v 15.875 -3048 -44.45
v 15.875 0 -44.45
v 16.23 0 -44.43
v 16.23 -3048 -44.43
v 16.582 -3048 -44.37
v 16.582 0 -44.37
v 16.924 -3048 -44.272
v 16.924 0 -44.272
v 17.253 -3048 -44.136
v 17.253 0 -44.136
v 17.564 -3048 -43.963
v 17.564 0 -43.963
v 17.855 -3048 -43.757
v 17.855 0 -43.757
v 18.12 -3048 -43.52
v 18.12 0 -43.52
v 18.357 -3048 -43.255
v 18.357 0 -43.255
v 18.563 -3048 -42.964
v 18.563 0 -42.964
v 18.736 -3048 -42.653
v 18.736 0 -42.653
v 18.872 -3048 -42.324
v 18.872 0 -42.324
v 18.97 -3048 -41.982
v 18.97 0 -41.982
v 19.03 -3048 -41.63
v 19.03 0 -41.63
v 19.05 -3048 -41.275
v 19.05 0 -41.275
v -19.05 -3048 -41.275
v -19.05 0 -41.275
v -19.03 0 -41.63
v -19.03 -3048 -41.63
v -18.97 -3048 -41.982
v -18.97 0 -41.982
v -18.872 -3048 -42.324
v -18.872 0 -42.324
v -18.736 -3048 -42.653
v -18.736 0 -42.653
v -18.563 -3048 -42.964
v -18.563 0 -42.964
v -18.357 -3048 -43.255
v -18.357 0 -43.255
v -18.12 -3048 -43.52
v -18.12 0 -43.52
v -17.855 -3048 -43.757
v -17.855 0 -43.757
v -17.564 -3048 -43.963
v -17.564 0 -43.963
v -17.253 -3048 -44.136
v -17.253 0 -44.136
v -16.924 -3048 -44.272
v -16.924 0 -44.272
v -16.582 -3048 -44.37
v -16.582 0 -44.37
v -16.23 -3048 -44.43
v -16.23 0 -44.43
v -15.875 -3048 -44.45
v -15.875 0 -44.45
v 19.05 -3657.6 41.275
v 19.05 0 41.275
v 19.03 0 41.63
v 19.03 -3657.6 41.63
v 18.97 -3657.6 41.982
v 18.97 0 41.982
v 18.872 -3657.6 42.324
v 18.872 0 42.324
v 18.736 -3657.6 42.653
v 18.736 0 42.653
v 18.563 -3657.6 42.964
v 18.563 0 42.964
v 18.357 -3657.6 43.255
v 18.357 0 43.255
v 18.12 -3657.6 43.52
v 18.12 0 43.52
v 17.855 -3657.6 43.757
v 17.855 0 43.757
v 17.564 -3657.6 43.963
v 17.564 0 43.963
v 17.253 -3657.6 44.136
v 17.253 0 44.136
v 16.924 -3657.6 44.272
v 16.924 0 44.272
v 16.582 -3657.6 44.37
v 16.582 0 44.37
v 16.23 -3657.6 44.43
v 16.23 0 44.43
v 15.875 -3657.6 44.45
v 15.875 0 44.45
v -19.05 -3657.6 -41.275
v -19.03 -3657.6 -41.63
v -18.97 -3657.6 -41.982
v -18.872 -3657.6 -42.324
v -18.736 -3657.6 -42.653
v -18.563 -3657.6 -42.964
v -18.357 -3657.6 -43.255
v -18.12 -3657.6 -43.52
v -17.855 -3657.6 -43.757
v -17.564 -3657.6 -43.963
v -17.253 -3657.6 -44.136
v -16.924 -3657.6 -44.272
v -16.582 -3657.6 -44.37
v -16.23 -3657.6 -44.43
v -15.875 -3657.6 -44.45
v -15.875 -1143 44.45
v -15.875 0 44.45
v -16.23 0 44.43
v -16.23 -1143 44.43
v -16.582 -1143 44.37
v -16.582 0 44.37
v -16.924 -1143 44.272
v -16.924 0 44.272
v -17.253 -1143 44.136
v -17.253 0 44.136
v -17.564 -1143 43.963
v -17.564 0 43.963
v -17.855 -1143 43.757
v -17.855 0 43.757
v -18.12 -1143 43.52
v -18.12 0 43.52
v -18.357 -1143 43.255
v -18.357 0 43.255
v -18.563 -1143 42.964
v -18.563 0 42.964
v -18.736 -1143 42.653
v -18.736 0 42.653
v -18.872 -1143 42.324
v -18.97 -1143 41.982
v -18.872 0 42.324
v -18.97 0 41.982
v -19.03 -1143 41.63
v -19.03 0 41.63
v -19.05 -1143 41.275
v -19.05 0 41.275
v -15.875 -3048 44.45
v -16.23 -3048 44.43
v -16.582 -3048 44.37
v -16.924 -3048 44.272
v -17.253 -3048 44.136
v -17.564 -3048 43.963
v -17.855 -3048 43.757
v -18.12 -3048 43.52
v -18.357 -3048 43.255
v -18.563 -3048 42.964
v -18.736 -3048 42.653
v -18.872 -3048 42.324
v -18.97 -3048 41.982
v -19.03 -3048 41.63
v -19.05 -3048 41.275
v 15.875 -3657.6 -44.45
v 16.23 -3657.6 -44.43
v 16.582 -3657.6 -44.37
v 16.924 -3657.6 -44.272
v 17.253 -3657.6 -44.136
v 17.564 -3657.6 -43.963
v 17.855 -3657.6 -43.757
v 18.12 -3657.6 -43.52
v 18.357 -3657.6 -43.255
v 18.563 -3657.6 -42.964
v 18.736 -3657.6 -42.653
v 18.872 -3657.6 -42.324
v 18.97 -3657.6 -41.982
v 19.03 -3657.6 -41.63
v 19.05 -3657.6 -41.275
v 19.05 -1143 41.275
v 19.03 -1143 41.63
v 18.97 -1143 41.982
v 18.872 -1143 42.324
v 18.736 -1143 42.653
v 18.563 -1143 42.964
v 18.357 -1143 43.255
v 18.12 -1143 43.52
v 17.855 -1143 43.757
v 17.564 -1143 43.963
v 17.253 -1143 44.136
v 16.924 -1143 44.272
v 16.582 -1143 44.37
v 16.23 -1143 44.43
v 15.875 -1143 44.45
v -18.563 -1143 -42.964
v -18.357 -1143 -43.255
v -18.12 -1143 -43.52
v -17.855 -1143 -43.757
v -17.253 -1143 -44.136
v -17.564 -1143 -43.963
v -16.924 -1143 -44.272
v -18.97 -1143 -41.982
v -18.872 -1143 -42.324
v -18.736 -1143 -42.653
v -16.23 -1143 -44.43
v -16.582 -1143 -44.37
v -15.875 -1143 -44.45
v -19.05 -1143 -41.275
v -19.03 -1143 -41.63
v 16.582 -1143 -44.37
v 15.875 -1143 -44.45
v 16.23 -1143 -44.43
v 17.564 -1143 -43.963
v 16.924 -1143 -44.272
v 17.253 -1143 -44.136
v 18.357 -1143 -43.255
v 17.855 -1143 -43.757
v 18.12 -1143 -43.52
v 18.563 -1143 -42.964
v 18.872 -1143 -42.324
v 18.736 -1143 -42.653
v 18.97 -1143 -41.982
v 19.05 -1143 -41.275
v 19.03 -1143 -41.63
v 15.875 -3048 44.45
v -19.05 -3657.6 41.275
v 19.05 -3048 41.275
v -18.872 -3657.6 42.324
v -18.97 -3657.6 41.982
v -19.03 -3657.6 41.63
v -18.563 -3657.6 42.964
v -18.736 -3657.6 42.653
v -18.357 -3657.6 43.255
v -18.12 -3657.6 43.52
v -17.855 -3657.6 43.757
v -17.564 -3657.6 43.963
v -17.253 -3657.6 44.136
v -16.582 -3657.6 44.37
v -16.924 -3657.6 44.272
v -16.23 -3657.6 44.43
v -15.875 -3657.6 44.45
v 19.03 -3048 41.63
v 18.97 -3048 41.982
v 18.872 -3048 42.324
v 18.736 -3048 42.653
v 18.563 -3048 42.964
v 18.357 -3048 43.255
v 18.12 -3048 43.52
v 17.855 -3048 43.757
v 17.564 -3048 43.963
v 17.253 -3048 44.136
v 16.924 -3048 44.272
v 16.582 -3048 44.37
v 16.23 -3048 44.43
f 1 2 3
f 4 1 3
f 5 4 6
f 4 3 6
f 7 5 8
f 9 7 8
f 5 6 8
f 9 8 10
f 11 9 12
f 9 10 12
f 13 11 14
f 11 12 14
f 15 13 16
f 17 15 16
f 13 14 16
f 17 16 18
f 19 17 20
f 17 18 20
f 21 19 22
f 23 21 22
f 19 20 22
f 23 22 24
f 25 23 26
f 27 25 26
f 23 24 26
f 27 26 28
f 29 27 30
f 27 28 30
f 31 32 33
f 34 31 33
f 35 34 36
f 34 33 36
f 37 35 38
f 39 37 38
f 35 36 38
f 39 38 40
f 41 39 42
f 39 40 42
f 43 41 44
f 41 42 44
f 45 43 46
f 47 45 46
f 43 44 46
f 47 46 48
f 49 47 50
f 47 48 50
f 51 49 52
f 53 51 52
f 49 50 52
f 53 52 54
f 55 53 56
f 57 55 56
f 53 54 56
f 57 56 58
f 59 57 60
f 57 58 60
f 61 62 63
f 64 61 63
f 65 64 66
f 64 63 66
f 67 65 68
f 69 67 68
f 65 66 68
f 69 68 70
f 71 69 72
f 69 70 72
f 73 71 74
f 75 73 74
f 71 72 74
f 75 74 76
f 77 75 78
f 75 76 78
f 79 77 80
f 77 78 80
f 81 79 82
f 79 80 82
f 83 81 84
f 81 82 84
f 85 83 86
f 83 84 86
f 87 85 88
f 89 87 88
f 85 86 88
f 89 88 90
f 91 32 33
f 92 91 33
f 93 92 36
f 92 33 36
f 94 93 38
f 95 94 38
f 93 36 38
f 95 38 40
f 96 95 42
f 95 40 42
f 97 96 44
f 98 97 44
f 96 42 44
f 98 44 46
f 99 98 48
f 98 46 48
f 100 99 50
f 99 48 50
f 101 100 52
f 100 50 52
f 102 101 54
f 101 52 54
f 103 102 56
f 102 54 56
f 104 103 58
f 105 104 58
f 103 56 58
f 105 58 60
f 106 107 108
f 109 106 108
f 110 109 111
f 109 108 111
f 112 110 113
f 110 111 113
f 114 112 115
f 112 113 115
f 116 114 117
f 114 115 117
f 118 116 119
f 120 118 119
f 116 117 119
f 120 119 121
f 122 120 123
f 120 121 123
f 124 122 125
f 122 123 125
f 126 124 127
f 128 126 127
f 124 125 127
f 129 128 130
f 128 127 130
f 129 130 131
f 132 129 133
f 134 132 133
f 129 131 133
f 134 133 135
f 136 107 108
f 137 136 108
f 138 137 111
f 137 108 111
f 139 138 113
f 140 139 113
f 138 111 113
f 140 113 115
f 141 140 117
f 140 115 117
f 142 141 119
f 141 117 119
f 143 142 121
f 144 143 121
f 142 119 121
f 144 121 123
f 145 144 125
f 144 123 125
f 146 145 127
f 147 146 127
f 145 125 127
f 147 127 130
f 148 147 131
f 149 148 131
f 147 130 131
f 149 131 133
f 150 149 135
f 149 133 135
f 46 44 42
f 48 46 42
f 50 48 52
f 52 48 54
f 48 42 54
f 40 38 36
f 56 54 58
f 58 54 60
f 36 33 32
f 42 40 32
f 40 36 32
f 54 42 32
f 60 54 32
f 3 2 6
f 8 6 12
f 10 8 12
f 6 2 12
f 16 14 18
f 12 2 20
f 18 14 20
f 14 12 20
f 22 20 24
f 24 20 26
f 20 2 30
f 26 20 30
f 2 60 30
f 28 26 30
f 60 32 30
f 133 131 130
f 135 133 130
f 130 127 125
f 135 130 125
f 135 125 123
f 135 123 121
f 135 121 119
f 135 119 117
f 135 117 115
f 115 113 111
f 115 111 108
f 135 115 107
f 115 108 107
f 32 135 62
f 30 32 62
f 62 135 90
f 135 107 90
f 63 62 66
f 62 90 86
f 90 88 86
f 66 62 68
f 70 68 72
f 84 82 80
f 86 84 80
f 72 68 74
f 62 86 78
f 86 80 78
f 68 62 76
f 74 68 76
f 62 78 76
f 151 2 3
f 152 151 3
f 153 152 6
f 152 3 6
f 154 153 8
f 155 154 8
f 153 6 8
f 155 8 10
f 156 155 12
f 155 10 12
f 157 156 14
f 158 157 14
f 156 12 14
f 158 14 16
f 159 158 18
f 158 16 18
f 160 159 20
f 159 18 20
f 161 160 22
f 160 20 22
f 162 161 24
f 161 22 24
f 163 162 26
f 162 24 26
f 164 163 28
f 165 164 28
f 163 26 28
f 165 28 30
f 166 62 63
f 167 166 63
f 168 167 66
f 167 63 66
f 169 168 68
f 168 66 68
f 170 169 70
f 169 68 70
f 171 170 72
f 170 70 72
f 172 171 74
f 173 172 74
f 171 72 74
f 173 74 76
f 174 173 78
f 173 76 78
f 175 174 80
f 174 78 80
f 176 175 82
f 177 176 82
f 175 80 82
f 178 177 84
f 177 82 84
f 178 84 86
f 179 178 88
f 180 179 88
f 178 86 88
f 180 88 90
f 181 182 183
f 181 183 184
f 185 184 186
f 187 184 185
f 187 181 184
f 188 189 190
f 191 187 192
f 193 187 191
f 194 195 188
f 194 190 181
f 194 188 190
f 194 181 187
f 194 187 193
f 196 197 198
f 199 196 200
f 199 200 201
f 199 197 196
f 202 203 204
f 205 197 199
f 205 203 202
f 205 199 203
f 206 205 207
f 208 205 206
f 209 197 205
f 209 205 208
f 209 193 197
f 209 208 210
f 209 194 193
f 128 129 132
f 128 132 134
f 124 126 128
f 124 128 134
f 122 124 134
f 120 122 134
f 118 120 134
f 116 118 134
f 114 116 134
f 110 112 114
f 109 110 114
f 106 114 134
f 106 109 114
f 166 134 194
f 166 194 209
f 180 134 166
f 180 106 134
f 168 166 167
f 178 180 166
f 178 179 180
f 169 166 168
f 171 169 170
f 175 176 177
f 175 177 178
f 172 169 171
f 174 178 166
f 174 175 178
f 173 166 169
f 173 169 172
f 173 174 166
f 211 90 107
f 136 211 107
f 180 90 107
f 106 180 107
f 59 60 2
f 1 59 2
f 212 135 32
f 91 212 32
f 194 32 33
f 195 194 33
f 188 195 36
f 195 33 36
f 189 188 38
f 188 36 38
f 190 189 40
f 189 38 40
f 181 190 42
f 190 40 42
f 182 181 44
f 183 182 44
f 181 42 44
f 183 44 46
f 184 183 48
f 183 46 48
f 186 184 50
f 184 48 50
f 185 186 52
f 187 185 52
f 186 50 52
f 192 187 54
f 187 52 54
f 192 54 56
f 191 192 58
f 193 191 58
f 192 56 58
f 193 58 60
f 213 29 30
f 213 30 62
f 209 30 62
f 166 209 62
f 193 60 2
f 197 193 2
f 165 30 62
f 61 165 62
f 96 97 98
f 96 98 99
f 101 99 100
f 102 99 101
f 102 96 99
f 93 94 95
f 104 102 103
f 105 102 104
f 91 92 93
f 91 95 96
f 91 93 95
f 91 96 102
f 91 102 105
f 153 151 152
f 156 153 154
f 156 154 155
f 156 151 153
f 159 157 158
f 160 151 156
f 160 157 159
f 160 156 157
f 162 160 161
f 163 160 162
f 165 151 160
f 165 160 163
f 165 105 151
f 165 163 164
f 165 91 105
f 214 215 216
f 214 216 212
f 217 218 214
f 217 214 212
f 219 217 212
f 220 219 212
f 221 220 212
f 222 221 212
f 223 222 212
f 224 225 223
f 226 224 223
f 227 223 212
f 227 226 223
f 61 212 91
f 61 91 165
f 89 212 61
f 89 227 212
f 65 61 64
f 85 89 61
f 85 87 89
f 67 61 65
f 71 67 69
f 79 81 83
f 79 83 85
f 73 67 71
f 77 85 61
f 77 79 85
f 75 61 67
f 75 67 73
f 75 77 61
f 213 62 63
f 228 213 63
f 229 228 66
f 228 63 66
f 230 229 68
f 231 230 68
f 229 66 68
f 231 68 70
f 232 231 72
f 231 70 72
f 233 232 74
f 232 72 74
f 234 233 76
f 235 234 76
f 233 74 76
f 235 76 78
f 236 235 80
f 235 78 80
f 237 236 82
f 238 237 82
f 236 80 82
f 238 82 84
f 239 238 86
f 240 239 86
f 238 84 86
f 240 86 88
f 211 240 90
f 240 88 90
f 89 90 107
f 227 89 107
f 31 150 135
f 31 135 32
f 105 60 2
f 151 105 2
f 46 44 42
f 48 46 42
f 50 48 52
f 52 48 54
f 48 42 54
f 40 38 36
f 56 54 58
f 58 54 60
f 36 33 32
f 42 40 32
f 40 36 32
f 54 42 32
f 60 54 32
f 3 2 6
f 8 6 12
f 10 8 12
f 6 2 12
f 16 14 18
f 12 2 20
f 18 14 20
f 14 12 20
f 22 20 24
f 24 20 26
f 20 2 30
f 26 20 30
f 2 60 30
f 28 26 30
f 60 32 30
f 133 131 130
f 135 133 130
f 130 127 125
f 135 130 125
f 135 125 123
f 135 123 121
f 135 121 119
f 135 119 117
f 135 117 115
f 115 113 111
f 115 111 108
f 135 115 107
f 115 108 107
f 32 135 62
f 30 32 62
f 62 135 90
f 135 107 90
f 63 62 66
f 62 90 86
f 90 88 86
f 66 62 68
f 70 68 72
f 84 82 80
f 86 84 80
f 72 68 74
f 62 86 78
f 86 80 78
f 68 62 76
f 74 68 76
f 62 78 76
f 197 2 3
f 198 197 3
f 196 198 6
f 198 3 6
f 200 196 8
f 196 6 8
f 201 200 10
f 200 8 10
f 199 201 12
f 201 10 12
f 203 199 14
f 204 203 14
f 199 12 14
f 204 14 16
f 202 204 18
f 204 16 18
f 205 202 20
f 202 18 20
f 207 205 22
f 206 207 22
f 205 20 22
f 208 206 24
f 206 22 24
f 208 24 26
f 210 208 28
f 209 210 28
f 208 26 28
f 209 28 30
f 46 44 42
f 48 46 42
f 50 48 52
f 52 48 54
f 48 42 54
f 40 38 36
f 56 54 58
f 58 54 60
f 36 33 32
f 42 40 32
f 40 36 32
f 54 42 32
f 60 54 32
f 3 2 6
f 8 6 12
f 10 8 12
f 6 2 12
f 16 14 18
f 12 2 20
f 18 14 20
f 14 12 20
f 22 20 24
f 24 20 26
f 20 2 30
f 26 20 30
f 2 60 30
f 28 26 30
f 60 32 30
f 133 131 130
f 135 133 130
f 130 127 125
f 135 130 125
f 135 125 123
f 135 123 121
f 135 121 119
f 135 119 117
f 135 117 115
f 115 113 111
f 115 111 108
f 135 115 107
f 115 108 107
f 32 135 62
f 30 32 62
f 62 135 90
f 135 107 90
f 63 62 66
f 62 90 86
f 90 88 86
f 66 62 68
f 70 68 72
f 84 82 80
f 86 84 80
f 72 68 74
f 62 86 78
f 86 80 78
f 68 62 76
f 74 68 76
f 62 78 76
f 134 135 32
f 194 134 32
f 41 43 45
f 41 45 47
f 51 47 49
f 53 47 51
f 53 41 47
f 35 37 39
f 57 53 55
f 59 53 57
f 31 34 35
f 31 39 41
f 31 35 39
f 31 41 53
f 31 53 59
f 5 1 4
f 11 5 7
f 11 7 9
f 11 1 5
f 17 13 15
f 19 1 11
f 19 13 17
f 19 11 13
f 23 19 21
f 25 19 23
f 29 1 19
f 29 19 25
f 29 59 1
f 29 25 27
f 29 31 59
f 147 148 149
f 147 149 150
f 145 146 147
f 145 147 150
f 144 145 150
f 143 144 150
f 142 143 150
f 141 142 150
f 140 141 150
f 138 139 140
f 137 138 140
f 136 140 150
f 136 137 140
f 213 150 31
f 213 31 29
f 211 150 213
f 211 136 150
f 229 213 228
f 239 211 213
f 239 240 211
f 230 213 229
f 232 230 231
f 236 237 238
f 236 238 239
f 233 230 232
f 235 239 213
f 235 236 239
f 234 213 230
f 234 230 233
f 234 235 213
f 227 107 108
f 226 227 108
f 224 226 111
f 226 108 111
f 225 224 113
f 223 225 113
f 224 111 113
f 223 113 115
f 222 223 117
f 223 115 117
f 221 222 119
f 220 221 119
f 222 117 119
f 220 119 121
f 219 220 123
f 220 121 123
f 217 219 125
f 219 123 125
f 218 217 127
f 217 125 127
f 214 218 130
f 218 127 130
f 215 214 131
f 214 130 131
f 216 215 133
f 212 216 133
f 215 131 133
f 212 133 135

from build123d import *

# Parameters (mm, degrees)
F1_DEPTH = 3657.6
F2_DEPTH = 1143
F3_DEPTH = 3048


with BuildPart() as f1:
    # F0 (on Front) → F1 (new body)
    with BuildSketch(Plane.XZ):
        with BuildLine():
            Line((15.875, 44.45), (-15.875, 44.45))
            ThreePointArc((-15.875, 44.45), (-18.120064, 43.520064), (-19.05, 41.275))
            Line((-19.05, 41.275), (-19.05, -41.275))
            ThreePointArc((-19.05, -41.275), (-18.120064, -43.520064), (-15.875, -44.45))
            Line((-15.875, -44.45), (15.875, -44.45))
            ThreePointArc((15.875, -44.45), (18.120064, -43.520064), (19.05, -41.275))
            Line((19.05, -41.275), (19.05, 41.275))
            ThreePointArc((19.05, 41.275), (18.120064, 43.520064), (15.875, 44.45))
        make_face()
    extrude(amount=F1_DEPTH)


with BuildPart() as f2:
    # F0 (on Front) → F2 (new body)
    with BuildSketch(Plane.XZ):
        with BuildLine():
            Line((15.875, 44.45), (-15.875, 44.45))
            ThreePointArc((-15.875, 44.45), (-18.120064, 43.520064), (-19.05, 41.275))
            Line((-19.05, 41.275), (-19.05, -41.275))
            ThreePointArc((-19.05, -41.275), (-18.120064, -43.520064), (-15.875, -44.45))
            Line((-15.875, -44.45), (15.875, -44.45))
            ThreePointArc((15.875, -44.45), (18.120064, -43.520064), (19.05, -41.275))
            Line((19.05, -41.275), (19.05, 41.275))
            ThreePointArc((19.05, 41.275), (18.120064, 43.520064), (15.875, 44.45))
        make_face()
    extrude(amount=F2_DEPTH)


with BuildPart() as f3:
    # F0 (on Front) → F3 (new body)
    with BuildSketch(Plane.XZ):
        with BuildLine():
            Line((15.875, 44.45), (-15.875, 44.45))
            ThreePointArc((-15.875, 44.45), (-18.120064, 43.520064), (-19.05, 41.275))
            Line((-19.05, 41.275), (-19.05, -41.275))
            ThreePointArc((-19.05, -41.275), (-18.120064, -43.520064), (-15.875, -44.45))
            Line((-15.875, -44.45), (15.875, -44.45))
            ThreePointArc((15.875, -44.45), (18.120064, -43.520064), (19.05, -41.275))
            Line((19.05, -41.275), (19.05, 41.275))
            ThreePointArc((19.05, 41.275), (18.120064, 43.520064), (15.875, 44.45))
        make_face()
    extrude(amount=F3_DEPTH)


solid = Compound([f1.part, f2.part, f3.part])
